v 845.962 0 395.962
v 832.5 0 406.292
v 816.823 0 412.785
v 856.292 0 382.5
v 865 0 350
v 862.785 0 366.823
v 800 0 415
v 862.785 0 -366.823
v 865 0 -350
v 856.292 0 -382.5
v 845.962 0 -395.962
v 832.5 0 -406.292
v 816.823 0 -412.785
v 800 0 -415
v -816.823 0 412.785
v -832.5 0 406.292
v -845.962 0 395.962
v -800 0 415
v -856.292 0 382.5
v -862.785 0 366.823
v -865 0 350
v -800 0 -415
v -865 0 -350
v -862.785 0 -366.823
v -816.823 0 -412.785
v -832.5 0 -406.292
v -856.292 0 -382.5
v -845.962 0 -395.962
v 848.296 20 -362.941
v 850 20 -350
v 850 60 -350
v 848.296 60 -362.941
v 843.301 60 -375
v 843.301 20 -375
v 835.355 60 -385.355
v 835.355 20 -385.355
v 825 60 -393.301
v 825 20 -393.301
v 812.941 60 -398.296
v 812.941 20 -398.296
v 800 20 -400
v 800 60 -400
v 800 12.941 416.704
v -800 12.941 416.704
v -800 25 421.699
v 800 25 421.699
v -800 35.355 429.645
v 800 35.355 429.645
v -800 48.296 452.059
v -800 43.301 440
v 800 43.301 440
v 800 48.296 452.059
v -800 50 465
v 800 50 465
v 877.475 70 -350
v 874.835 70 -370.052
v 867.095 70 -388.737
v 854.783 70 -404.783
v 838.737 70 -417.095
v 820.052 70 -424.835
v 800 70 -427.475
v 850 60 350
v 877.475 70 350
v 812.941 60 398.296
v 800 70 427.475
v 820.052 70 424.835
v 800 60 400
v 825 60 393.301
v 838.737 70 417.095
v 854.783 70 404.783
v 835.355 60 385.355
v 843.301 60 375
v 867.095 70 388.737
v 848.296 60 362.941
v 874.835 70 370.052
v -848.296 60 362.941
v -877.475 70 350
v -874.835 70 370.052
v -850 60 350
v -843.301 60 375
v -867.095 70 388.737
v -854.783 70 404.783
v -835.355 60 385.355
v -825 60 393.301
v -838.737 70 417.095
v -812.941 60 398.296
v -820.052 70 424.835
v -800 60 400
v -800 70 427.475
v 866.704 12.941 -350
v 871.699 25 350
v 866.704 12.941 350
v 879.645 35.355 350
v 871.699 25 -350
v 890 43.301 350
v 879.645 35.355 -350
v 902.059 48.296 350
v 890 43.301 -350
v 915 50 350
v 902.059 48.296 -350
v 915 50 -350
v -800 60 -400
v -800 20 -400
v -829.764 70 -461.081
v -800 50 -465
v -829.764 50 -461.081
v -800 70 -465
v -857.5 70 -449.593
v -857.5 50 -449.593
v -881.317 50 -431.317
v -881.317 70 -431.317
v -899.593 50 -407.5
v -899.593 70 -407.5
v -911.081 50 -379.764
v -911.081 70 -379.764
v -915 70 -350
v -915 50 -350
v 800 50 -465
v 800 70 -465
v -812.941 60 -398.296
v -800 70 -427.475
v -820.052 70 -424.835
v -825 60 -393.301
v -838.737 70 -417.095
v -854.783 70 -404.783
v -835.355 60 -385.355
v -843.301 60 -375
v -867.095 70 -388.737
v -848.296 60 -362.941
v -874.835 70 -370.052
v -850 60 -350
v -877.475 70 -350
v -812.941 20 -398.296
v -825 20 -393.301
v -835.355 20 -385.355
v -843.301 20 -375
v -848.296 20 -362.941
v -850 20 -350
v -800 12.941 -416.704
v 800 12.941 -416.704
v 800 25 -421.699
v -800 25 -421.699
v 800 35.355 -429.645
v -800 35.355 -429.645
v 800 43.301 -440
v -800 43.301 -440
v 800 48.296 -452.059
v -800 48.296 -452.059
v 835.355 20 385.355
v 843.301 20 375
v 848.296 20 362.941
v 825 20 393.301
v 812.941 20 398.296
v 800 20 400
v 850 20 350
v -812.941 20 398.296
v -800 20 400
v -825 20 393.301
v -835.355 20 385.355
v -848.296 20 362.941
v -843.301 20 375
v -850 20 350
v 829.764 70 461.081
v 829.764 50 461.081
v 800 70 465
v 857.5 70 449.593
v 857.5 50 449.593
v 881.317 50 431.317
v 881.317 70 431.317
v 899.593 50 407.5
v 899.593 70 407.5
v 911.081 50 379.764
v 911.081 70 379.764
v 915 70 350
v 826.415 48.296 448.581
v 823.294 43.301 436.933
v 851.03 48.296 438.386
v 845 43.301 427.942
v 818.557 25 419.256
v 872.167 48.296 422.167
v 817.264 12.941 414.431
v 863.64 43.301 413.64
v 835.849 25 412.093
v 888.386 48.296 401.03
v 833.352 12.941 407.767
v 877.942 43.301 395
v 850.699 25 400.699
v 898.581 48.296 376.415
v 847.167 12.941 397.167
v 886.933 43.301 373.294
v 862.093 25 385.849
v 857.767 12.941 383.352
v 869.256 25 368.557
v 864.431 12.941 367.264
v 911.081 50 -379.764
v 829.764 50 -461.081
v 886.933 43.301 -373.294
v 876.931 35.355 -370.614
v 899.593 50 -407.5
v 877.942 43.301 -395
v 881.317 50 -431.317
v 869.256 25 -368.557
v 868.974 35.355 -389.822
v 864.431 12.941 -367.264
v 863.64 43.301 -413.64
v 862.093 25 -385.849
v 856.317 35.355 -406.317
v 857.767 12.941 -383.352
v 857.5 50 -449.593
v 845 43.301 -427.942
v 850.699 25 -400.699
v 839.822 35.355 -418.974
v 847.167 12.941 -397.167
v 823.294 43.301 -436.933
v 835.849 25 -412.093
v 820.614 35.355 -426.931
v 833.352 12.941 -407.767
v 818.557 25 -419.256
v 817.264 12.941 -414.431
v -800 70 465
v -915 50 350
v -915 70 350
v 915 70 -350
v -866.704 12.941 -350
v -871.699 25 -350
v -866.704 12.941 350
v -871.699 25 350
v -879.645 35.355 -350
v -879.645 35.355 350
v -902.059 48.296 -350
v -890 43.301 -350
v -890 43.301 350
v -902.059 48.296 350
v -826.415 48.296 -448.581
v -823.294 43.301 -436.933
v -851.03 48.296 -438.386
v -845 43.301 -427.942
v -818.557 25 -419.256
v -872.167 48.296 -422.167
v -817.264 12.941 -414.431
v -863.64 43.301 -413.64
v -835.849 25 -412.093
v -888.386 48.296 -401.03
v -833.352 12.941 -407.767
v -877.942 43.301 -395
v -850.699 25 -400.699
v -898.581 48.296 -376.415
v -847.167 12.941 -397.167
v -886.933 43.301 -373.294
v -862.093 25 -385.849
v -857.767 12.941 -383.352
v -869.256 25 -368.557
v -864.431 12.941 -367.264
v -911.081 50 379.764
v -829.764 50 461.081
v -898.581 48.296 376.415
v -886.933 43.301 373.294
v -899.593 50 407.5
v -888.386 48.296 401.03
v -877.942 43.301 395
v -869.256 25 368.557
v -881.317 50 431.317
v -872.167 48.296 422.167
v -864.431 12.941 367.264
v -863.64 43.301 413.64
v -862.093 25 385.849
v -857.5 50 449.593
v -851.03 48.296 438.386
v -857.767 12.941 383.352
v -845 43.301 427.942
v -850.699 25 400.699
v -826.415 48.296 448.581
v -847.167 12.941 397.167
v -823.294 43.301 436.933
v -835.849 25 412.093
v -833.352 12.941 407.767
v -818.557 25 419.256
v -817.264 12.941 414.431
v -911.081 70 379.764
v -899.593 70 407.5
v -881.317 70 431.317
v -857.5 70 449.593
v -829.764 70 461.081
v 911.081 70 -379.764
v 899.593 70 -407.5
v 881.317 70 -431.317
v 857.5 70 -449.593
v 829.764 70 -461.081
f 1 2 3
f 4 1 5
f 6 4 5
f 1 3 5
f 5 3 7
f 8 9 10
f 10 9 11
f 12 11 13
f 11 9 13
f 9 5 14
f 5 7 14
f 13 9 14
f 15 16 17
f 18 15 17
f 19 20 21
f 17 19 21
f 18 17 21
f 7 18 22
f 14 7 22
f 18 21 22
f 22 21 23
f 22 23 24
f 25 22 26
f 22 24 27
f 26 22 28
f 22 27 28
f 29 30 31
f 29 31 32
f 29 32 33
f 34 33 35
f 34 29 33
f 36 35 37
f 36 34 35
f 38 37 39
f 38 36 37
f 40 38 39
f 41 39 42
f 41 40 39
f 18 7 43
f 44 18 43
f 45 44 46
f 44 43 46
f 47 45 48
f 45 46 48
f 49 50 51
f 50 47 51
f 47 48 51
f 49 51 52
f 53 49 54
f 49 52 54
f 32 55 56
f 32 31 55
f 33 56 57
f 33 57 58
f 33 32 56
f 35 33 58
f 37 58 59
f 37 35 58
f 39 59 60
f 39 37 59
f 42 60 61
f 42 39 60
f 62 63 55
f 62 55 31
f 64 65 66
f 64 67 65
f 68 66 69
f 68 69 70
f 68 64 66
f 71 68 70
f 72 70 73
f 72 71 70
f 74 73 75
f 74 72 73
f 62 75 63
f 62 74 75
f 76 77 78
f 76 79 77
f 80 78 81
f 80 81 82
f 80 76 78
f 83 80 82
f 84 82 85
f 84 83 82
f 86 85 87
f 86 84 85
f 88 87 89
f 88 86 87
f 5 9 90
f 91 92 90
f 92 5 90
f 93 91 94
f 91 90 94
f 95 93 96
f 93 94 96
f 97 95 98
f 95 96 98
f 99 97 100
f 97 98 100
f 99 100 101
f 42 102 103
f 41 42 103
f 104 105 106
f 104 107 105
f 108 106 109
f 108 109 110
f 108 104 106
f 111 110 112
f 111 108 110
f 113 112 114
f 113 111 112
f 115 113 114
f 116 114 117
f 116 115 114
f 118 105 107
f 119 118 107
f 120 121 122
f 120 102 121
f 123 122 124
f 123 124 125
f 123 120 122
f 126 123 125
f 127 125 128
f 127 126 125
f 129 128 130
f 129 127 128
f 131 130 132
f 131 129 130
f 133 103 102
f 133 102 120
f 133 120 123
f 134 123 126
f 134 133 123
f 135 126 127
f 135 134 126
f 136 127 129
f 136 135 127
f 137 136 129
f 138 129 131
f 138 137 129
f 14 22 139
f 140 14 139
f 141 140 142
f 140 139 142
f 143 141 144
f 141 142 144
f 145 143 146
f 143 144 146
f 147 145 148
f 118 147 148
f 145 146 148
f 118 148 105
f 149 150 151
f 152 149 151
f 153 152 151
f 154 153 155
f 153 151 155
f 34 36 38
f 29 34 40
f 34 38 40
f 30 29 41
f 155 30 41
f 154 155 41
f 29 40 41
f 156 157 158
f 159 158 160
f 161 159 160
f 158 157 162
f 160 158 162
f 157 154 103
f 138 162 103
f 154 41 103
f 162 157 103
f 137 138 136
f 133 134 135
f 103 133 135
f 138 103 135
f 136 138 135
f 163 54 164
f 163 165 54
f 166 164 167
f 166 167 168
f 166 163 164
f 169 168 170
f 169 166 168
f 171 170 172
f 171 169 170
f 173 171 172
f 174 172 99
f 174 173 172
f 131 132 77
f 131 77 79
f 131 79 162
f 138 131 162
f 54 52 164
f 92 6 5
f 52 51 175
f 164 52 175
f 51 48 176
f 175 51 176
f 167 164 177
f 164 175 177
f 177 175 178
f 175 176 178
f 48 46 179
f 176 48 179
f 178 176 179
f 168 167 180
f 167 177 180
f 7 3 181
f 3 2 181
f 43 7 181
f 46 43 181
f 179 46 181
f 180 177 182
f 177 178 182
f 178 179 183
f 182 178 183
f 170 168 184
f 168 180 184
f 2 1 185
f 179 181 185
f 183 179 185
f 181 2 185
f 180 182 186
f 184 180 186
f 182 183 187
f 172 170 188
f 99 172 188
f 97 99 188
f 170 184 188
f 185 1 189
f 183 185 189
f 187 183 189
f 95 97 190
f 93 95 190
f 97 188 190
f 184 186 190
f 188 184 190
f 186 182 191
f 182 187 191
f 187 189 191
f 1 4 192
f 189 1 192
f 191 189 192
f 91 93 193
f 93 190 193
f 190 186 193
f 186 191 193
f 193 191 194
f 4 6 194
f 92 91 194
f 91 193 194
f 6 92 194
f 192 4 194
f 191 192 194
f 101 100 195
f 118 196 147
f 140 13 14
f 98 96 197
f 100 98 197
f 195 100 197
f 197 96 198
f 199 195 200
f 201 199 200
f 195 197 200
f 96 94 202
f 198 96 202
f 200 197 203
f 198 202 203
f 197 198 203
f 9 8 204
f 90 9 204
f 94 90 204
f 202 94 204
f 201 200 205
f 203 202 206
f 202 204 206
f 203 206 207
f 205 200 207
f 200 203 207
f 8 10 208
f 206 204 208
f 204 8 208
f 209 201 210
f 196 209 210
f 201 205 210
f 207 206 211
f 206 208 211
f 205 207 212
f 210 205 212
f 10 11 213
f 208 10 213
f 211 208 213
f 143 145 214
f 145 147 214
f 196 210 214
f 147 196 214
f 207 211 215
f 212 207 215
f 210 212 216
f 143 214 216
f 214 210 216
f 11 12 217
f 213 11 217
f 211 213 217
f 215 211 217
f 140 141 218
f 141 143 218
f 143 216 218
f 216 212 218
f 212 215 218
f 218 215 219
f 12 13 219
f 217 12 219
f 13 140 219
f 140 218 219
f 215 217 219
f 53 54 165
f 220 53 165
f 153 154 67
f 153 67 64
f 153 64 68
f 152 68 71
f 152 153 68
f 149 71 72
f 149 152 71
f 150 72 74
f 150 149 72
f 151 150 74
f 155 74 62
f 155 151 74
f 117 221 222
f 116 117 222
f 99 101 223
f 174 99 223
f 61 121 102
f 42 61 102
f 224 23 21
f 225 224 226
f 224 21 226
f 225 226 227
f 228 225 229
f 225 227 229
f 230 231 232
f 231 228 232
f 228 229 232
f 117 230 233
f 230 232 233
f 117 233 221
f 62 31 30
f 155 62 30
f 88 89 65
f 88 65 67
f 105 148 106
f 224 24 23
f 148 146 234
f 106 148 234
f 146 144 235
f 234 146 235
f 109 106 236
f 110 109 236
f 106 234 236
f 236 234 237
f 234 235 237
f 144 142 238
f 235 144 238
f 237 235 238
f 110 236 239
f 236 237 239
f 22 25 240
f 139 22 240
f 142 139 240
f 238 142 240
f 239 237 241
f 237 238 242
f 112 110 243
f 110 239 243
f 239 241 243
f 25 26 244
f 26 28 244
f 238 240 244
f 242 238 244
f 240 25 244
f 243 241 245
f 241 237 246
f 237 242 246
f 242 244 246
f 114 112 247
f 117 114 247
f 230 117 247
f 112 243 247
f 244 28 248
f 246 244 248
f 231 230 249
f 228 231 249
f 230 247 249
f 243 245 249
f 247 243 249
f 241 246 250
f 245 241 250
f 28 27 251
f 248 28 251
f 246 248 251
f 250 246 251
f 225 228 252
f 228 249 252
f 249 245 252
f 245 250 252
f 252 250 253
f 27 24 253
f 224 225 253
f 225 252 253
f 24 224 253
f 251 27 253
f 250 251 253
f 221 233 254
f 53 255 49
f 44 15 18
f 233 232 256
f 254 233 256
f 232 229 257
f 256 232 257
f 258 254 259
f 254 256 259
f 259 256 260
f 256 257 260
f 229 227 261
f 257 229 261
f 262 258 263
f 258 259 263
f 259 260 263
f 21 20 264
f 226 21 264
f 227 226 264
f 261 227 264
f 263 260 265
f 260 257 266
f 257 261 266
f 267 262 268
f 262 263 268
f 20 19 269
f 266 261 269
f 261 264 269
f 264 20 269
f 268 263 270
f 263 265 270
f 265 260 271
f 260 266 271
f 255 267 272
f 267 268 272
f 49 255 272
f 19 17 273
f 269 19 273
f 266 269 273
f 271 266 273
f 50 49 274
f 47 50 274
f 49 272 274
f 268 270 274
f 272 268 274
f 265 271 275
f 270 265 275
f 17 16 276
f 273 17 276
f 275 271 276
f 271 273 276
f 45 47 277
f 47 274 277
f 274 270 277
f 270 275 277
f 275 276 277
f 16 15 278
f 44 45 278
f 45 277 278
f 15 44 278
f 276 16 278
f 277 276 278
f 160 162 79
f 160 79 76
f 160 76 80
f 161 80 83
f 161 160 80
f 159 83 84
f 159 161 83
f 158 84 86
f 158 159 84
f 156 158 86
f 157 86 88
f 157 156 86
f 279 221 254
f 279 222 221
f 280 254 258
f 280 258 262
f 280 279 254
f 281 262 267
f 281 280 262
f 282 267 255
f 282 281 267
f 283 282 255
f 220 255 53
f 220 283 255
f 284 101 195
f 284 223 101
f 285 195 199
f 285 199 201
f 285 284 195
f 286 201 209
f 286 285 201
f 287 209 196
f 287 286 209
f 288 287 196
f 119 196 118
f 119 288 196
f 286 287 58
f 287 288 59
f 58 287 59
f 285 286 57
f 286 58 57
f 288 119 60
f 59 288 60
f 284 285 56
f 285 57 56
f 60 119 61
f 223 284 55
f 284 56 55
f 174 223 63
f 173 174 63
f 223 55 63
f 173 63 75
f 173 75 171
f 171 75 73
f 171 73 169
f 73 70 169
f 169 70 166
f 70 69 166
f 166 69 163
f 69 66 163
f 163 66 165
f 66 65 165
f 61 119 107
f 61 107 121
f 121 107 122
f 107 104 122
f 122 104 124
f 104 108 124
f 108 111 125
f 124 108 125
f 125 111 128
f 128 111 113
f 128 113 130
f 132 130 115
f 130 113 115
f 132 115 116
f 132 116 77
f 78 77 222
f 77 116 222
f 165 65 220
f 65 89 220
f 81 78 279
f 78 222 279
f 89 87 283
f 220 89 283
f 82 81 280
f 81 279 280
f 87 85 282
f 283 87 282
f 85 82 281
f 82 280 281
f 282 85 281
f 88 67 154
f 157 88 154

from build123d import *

# Parameters (mm, degrees)
EXTRUDE_1_DEPTH = 20


with BuildPart() as part:
    # 草图1 → 凸台-拉伸1 (new body)
    with BuildSketch(Plane(origin=(0, 0, 0), x_dir=(1, 0, 0), z_dir=(0, 1, 0))):
        with BuildLine():
            Line((-800, 400), (800, 400))
            ThreePointArc((800, 400), (835.355339059, 385.355339059), (850, 350))
            Line((850, 350), (850, -350))
            ThreePointArc((850, -350), (835.355339059, -385.355339059), (800, -400))
            Line((800, -400), (-800, -400))
            ThreePointArc((-800, -400), (-835.355339059, -385.355339059), (-850, -350))
            Line((-850, -350), (-850, 350))
            ThreePointArc((-850, 350), (-835.355339059, 385.355339059), (-800, 400))
        make_face()
    extrude(amount=EXTRUDE_1_DEPTH)

    # 扫描1: sweep along a path in 草图4
    with BuildLine(Plane(origin=(0, 20, 0), x_dir=(1, 0, 0), z_dir=(0, 1, 0))) as sweep_1_path:
        Line((800, 400), (-800, 400))
        ThreePointArc((-800, 400), (-835.355339059, 385.355339059), (-850, 350))
        Line((-850, 350), (-850, -350))
        ThreePointArc((-850, -350), (-835.355339059, -385.355339059), (-800, -400))
        Line((-800, -400), (800, -400))
        ThreePointArc((800, -400), (835.355339059, -385.355339059), (850, -350))
        Line((850, -350), (850, 350))
        ThreePointArc((850, 350), (835.355339059, 385.355339059), (800, 400))
    # 草图3 → 扫描1 (sweep)
    with BuildSketch(Plane(origin=(0, 0, 350), x_dir=(0, -1, 0), z_dir=(0, 0, 1))):
        with BuildLine():
            Line((0, 850), (-60, 850))
            Line((-60, 850), (-70, 877.474774195))
            Line((-70, 877.474774195), (-70, 915))
            Line((-70, 915), (-50, 915))
            ThreePointArc((-50, 915), (-35.355339059, 879.644660941), (0, 865))
            Line((0, 865), (0, 850))
        make_face()
    sweep(path=sweep_1_path.line)


solid = part.part
